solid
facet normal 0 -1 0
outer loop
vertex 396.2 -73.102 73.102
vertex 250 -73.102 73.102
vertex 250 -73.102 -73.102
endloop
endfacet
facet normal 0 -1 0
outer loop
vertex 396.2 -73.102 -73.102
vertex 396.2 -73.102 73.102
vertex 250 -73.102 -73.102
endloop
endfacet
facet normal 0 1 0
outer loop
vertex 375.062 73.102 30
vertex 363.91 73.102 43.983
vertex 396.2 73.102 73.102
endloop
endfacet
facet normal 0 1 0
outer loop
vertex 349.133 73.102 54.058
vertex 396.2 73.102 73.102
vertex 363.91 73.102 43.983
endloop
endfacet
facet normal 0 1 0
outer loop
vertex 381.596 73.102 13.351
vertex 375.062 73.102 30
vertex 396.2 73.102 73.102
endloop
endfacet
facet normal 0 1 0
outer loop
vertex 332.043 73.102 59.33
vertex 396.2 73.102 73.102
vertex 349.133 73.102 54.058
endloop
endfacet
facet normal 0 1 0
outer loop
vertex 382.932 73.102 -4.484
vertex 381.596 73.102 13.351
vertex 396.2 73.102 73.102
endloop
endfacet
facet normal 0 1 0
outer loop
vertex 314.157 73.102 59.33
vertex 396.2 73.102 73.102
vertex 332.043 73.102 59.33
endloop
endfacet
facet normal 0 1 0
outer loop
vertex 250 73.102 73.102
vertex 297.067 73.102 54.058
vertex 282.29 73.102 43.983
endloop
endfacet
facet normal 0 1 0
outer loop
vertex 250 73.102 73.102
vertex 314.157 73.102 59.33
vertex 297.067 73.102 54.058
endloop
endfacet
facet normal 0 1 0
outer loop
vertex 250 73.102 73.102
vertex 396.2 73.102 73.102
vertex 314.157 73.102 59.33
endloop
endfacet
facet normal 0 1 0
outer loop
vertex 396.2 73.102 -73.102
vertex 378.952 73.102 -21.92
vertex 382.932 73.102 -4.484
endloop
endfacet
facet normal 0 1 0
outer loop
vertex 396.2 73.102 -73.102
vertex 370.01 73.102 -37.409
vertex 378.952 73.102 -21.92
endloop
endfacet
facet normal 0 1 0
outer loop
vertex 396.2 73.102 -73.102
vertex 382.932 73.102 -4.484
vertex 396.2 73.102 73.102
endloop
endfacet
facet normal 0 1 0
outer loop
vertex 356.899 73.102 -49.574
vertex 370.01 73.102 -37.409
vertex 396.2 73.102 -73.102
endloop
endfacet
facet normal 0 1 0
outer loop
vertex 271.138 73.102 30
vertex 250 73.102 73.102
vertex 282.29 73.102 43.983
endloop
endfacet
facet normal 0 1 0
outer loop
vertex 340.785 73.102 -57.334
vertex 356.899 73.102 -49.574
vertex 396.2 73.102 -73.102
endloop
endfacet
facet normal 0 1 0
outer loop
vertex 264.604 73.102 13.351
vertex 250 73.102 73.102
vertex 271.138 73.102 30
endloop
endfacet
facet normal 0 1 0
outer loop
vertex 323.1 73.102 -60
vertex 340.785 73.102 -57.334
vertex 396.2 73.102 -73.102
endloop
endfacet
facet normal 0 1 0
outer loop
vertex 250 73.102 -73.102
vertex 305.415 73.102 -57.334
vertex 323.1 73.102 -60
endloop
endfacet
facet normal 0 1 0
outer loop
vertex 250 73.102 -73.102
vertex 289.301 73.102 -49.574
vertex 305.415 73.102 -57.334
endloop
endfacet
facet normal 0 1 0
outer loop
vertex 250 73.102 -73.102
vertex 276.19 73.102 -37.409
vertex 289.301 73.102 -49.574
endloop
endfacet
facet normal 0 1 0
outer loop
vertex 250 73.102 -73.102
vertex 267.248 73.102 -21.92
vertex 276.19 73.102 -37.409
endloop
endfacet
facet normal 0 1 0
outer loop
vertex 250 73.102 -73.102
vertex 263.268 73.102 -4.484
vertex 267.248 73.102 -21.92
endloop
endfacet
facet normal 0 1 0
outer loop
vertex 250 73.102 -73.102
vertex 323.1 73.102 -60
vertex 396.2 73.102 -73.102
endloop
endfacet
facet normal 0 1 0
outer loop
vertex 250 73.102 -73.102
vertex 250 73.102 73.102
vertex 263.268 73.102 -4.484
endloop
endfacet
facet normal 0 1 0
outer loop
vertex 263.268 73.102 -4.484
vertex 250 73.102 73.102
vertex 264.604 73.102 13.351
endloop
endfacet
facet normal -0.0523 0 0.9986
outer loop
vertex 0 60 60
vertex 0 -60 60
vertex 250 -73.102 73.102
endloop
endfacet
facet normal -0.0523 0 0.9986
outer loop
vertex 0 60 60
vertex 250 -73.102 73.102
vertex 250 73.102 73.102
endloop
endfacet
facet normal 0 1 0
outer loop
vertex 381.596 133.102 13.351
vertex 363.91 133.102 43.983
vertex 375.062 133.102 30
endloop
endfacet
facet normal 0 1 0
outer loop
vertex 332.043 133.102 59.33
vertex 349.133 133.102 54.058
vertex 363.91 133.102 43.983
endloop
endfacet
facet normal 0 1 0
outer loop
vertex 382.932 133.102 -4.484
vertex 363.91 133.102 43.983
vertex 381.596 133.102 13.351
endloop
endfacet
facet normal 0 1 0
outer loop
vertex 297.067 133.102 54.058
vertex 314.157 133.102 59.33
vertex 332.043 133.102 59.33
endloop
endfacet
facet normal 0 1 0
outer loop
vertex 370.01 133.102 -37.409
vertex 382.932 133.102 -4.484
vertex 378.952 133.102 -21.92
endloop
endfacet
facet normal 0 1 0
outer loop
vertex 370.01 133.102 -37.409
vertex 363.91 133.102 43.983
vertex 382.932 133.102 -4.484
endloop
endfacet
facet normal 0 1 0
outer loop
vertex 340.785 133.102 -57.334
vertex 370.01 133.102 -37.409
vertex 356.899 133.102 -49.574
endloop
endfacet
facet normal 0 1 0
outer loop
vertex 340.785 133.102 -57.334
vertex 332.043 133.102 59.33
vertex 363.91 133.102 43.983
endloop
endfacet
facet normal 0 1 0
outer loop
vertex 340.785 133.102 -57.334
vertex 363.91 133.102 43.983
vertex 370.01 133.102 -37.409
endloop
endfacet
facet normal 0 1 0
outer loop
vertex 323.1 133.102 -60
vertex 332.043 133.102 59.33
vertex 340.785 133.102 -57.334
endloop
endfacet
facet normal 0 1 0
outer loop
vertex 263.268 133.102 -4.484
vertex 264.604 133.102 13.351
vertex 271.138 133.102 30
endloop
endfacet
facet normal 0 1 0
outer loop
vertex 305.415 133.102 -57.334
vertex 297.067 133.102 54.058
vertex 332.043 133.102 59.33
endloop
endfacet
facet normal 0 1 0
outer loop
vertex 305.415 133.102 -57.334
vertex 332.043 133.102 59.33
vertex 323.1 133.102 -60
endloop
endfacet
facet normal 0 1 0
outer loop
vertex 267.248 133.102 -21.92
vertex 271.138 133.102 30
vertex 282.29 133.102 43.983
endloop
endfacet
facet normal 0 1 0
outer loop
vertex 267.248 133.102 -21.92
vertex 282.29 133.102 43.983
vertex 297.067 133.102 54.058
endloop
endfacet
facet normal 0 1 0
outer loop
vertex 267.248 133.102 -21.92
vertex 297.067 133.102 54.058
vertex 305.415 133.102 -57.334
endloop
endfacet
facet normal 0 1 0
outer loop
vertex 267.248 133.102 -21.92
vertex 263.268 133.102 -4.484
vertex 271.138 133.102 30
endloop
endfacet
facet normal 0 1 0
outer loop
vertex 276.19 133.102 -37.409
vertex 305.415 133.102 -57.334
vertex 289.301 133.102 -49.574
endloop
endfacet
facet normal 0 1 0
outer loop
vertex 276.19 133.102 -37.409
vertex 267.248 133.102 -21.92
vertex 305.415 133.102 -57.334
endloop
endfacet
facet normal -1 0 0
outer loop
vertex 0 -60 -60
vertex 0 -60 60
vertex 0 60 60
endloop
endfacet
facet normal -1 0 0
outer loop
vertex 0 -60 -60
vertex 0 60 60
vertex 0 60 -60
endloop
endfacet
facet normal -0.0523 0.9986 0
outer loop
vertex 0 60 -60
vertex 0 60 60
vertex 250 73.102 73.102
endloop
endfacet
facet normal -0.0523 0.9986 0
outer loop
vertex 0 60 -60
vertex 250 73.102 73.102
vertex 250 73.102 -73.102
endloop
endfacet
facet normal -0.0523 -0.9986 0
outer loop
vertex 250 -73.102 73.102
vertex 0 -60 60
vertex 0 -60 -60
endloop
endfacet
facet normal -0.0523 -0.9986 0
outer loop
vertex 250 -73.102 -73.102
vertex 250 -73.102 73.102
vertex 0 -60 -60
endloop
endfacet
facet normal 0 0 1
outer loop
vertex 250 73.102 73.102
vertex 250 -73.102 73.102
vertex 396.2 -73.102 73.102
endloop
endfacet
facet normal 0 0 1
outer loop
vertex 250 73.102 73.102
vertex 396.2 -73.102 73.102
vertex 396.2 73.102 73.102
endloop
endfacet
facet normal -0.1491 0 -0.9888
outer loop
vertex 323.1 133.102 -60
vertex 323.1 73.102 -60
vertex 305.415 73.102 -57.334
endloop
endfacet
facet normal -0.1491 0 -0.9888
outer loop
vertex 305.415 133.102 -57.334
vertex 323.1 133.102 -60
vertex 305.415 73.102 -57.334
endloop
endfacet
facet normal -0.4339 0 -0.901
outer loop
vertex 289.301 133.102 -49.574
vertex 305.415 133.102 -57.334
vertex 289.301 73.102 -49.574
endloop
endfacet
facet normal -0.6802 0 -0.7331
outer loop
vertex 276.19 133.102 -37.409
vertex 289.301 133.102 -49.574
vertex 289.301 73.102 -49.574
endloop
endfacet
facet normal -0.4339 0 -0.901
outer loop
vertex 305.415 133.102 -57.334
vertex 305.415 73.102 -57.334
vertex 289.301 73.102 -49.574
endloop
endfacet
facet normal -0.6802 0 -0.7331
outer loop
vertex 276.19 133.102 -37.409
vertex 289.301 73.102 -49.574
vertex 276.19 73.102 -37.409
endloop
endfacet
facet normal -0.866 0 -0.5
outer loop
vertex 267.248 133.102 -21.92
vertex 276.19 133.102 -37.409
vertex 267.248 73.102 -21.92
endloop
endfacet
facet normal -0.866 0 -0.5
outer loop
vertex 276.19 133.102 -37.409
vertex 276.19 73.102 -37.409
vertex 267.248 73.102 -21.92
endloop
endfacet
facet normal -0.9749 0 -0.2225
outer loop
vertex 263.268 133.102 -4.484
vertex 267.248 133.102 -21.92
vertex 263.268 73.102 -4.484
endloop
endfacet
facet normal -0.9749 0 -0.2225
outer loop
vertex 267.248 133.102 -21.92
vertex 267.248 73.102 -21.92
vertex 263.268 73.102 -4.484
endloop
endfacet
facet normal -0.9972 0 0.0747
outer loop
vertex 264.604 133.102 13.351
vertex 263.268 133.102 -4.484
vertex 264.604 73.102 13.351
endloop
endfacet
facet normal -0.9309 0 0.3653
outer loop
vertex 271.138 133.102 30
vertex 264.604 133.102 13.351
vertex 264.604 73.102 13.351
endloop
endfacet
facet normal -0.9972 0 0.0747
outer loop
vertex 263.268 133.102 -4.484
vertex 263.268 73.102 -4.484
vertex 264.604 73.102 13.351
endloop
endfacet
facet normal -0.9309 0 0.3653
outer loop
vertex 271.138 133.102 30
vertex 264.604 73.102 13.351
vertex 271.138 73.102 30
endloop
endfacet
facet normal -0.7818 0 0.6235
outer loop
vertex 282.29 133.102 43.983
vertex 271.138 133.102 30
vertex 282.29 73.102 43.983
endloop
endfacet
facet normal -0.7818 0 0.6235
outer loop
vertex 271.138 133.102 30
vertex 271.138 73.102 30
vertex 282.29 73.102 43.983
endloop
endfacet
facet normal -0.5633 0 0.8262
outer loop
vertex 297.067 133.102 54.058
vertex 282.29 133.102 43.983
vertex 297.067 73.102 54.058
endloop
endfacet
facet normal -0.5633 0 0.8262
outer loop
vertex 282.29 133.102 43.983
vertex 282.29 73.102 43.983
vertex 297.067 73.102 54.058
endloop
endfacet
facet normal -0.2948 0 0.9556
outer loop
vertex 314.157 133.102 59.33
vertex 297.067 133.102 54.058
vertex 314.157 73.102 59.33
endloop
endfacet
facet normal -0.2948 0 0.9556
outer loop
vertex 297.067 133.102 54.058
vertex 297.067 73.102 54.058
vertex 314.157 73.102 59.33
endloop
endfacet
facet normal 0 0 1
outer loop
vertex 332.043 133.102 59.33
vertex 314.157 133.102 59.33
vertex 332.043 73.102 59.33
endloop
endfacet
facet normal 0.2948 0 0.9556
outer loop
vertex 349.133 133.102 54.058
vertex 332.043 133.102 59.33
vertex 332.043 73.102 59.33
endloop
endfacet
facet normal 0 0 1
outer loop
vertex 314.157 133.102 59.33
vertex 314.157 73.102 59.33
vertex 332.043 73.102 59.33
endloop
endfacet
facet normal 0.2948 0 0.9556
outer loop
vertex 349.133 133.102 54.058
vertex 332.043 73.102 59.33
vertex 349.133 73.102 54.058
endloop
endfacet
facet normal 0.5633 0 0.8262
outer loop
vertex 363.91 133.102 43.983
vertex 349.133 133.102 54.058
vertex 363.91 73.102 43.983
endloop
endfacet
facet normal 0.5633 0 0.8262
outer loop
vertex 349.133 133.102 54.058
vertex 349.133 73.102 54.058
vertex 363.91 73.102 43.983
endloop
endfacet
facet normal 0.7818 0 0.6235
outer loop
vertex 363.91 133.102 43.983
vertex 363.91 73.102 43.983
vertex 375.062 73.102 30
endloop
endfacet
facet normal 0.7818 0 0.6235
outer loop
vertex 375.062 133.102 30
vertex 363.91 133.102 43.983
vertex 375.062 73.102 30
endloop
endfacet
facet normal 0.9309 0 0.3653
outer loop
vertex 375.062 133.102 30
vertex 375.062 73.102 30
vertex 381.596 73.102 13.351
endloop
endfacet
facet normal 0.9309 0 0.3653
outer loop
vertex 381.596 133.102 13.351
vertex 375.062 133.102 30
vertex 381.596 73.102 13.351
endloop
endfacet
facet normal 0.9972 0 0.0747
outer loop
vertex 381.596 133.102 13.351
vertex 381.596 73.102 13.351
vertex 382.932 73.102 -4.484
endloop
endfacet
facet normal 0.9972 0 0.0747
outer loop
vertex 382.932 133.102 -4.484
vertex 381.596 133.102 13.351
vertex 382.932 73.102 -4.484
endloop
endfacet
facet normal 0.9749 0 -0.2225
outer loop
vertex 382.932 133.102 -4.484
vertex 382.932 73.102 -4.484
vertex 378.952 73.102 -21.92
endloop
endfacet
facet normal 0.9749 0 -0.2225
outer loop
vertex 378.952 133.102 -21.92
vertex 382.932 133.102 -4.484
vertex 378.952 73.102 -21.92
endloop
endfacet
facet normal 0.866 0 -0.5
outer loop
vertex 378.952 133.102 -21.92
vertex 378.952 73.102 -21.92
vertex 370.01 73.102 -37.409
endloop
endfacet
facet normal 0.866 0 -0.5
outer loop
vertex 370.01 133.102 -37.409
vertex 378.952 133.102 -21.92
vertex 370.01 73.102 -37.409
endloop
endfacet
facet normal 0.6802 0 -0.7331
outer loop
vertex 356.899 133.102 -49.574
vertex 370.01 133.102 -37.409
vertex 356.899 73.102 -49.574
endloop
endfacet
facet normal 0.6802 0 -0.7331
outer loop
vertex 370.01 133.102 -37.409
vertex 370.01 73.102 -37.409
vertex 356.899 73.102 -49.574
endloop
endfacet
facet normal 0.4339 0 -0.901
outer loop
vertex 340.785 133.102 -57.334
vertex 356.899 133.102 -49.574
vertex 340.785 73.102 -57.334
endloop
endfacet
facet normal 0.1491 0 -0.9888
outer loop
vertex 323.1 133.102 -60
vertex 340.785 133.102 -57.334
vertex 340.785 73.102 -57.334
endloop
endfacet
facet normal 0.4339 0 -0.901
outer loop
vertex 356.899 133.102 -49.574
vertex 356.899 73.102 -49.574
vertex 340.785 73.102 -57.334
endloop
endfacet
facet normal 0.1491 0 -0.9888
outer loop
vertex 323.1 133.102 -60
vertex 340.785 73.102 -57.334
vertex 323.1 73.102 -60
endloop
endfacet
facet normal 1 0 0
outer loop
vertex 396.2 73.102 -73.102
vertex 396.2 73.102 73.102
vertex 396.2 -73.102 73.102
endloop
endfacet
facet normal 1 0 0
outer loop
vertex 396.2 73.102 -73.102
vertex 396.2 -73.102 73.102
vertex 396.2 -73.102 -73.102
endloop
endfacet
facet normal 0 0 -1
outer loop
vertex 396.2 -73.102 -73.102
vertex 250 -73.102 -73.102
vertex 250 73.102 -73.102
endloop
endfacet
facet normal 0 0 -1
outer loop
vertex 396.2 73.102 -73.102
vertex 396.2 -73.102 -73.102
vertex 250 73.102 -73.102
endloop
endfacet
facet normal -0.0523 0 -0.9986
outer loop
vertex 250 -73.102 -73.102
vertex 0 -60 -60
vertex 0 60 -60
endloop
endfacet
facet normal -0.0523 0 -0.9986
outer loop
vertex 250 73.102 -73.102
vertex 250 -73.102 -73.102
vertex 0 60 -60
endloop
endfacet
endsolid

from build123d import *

# Parameters (mm, degrees)
SKETCH1_W           = 120
SKETCH1_H           = 120
BOSS_EXTRUDE1_DEPTH = 250
BOSS_EXTRUDE1_DRAFT = -3
SKETCH2_W           = 146.203889642
SKETCH2_H           = 146.203889642
BOSS_EXTRUDE2_DEPTH = 146.2
SKETCH3_R           = 60
BOSS_EXTRUDE3_DEPTH = 60


with BuildPart() as part:
    # Sketch1 → Boss-Extrude1 (with draft: the straight prism first)
    with BuildSketch(Plane(origin=(0, 0, 0), x_dir=(0, 0, -1), z_dir=(1, 0, 0))):
        Rectangle(SKETCH1_W, SKETCH1_H)
    extrude(amount=BOSS_EXTRUDE1_DEPTH)
    # Boss-Extrude1: the draft: its side faces are tilted about the plane it starts from
    boss_extrude1_sides = [part.faces().sort_by_distance(p)[0] for p in [
        (125, 0, 60),
        (125, -60, 0),
        (125, 0, -60),
        (125, 60, 0),
    ]]
    draft(boss_extrude1_sides, Plane(origin=(0, 0, 0), x_dir=(0, 0, -1), z_dir=(1, 0, 0)), BOSS_EXTRUDE1_DRAFT)

    # Sketch2 → Boss-Extrude2 (add)
    with BuildSketch(Plane(origin=(250, 0, 0), x_dir=(0, 0, -1), z_dir=(1, 0, 0))):
        Rectangle(SKETCH2_W, SKETCH2_H)
    extrude(amount=BOSS_EXTRUDE2_DEPTH)

    # Sketch3 → Boss-Extrude3 (add)
    with BuildSketch(Plane(origin=(0, 73.101944821, 0), x_dir=(1, 0, 0), z_dir=(0, 1, 0))):
        with Locations(Location((323.1, 0, 0), (0, 0, 90))):
            Circle(SKETCH3_R)
    extrude(amount=BOSS_EXTRUDE3_DEPTH)


solid = part.part
